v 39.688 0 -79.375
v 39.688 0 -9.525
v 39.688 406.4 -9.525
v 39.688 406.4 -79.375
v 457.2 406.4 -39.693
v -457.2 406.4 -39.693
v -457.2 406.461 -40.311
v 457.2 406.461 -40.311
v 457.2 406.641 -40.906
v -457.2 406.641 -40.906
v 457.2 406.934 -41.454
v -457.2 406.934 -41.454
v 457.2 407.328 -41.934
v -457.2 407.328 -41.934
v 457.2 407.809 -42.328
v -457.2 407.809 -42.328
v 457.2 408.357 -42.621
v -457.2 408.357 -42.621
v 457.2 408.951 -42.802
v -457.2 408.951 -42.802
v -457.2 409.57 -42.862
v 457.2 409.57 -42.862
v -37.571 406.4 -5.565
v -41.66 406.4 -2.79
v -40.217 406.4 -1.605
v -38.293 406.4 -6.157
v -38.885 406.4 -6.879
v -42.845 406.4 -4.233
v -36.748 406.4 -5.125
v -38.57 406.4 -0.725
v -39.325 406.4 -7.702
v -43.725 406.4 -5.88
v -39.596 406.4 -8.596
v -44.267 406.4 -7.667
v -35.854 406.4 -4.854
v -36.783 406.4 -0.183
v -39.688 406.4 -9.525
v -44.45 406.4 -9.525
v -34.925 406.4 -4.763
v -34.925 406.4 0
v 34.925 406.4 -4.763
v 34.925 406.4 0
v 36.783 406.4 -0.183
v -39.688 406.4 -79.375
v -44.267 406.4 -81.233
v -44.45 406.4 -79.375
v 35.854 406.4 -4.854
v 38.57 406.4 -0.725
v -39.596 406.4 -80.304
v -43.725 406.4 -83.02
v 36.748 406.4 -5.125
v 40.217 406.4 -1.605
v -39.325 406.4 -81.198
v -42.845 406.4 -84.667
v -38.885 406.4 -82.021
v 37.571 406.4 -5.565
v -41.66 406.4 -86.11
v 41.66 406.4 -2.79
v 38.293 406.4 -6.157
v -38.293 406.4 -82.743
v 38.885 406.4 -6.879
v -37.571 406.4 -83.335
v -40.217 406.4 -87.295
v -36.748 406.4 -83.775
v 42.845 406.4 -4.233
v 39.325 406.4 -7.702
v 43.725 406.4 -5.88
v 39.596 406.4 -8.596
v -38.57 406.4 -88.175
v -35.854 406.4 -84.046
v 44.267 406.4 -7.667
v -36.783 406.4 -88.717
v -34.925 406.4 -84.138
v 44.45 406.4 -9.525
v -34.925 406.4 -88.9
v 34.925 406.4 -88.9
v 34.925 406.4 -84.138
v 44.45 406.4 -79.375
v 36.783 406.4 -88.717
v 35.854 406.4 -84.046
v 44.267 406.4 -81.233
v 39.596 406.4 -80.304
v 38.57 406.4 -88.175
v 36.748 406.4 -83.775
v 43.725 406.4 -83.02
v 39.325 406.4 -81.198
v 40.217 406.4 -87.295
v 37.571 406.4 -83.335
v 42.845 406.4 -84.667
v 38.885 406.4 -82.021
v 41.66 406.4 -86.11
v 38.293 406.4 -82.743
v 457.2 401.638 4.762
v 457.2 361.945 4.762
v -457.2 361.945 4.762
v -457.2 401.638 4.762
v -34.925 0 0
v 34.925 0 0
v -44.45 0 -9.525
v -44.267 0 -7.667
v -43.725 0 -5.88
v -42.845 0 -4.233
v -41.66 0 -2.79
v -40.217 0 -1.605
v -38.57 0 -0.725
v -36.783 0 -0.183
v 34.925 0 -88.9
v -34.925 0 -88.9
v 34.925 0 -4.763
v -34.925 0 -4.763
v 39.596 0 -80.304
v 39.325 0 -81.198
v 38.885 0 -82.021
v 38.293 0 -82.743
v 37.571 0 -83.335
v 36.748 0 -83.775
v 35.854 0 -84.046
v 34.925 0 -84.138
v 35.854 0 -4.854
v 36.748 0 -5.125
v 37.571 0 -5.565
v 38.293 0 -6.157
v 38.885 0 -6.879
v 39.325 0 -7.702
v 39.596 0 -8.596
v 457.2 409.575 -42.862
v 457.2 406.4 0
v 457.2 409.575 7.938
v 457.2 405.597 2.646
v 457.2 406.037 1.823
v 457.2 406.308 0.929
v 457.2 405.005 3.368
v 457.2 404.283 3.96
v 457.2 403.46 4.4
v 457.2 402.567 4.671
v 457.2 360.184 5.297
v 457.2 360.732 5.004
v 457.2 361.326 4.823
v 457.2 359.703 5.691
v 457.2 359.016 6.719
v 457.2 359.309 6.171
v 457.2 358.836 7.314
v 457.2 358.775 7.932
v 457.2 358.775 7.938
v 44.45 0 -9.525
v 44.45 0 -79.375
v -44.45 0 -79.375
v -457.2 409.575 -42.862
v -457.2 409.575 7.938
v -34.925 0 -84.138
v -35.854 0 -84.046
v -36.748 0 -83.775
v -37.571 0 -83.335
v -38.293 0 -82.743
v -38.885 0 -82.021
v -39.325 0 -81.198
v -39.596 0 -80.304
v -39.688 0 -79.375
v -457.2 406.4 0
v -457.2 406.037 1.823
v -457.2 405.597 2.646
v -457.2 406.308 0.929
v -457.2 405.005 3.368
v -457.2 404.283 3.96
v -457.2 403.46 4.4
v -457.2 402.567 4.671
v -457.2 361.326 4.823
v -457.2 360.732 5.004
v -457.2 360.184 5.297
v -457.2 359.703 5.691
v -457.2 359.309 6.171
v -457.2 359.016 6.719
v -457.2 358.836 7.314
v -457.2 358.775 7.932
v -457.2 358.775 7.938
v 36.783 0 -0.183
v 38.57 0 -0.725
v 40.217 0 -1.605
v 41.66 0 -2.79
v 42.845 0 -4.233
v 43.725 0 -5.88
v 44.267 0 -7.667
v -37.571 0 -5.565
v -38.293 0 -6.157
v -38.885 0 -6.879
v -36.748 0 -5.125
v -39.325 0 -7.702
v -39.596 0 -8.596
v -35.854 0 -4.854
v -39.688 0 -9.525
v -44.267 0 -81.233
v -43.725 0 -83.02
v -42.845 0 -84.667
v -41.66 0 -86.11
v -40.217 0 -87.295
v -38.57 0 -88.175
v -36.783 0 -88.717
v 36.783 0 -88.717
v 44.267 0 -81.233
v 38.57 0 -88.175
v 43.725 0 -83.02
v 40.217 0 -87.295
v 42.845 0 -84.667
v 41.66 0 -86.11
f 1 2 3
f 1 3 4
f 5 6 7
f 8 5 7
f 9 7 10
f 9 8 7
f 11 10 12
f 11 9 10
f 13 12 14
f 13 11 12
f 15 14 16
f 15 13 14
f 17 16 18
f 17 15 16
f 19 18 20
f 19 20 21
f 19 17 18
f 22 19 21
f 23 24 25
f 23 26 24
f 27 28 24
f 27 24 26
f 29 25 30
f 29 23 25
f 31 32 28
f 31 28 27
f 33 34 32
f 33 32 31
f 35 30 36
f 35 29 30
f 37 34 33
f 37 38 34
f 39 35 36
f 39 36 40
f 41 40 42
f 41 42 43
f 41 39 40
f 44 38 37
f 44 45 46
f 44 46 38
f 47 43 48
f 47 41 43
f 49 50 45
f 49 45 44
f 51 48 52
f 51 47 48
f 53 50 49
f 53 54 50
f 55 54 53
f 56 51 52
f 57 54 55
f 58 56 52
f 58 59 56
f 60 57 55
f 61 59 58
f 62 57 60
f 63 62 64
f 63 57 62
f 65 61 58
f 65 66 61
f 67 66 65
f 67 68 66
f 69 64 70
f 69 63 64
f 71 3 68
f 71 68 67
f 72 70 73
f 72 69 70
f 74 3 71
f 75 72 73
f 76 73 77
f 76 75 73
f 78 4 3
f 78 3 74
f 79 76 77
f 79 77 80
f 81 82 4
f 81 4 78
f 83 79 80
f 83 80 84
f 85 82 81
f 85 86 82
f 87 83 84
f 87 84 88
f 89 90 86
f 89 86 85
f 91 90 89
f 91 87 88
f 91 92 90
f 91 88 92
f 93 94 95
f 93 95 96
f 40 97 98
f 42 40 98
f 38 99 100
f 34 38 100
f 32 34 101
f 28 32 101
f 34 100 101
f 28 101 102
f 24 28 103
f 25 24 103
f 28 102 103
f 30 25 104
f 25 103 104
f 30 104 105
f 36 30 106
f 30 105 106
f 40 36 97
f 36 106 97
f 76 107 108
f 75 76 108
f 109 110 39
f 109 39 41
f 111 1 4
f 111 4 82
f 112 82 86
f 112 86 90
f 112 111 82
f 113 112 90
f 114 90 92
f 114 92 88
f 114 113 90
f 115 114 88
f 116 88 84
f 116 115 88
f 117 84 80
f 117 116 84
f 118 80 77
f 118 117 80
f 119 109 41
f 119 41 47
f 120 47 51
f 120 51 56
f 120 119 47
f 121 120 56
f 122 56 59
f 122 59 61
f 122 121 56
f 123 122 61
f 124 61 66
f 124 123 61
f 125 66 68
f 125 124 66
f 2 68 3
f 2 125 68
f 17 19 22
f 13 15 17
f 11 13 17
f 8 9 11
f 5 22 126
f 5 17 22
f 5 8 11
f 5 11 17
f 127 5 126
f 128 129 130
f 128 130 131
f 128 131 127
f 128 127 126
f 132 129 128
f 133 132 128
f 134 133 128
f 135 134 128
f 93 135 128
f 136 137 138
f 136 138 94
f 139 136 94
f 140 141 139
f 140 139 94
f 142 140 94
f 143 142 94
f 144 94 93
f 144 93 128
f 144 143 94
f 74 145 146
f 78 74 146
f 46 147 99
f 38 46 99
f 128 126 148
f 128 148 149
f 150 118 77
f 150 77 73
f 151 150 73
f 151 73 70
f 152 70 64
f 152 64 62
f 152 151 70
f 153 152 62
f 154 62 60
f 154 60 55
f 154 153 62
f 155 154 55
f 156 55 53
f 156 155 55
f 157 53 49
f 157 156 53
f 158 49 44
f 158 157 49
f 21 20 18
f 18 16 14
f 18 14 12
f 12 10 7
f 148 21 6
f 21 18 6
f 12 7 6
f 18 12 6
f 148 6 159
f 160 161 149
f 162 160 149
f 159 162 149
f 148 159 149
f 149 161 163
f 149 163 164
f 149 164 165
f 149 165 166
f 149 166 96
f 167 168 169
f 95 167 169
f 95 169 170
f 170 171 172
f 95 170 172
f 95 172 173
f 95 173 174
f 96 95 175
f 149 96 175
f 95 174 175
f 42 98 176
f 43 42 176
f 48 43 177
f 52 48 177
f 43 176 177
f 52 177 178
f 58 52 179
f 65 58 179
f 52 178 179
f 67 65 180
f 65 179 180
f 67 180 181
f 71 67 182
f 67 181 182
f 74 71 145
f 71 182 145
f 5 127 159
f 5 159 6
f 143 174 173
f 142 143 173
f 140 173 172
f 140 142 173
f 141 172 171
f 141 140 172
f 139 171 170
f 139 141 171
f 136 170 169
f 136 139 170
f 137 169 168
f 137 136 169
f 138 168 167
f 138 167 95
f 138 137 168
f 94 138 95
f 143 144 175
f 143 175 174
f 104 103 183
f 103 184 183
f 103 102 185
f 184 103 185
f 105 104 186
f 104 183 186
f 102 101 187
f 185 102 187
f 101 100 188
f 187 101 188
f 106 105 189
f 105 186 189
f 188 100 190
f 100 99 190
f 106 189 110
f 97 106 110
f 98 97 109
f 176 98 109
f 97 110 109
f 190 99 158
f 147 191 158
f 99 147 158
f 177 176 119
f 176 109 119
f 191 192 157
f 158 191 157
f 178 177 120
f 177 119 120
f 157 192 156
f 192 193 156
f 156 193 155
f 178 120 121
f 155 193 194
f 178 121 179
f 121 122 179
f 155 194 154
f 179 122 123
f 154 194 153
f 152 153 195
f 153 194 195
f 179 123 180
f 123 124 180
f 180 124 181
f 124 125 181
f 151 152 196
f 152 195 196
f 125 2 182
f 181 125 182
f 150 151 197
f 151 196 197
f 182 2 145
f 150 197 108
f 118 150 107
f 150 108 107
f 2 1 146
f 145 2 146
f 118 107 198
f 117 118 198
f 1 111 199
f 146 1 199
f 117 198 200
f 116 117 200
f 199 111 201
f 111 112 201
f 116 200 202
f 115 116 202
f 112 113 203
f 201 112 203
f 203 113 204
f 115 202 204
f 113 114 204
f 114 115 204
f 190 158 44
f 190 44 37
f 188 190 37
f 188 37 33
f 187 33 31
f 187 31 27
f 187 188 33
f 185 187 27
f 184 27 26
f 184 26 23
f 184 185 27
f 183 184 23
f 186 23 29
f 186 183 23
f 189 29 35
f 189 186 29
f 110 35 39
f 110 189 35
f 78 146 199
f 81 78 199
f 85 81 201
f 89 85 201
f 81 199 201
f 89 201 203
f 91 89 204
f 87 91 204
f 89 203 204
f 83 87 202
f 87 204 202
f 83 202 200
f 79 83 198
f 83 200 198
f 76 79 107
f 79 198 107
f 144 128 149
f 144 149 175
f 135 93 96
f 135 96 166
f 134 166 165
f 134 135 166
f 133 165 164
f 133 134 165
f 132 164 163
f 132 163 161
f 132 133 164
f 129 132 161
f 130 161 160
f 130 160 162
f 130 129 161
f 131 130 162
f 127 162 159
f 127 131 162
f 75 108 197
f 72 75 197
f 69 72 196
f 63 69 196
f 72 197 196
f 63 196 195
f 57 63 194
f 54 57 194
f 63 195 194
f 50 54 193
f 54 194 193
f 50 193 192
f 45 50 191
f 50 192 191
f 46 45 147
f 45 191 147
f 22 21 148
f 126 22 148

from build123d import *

# Parameters (mm, degrees)
VERTICAL_DEPTH = 406.4
CROSSBAR_DEPTH = 914.4


with BuildPart() as part:
    # Sketch12 → vertical (new body)
    with BuildSketch(Plane(origin=(0, 0, -44.45), x_dir=(1, 0, 0), z_dir=(0, 1, 0))):
        with BuildLine():
            Line((-34.925, -44.45), (34.925, -44.45))
            ThreePointArc((34.925, -44.45), (41.660192091, -41.660192091), (44.45, -34.925))
            Line((44.45, -34.925), (44.45, 34.925))
            ThreePointArc((44.45, 34.925), (41.660192091, 41.660192091), (34.925, 44.45))
            Line((34.925, 44.45), (-34.925, 44.45))
            ThreePointArc((-34.925, 44.45), (-41.660192091, 41.660192091), (-44.45, 34.925))
            Line((-44.45, 34.925), (-44.45, -34.925))
            ThreePointArc((-44.45, -34.925), (-41.660192091, -41.660192091), (-34.925, -44.45))
        make_face()
        with BuildLine():
            Line((-34.925, -39.6875), (34.925, -39.6875))
            ThreePointArc((34.925, -39.6875), (38.292596045, -38.292596045), (39.6875, -34.925))
            Line((39.6875, -34.925), (39.6875, 34.925))
            ThreePointArc((39.6875, 34.925), (38.292596045, 38.292596045), (34.925, 39.6875))
            Line((34.925, 39.6875), (-34.925, 39.6875))
            ThreePointArc((-34.925, 39.6875), (-38.292596045, 38.292596045), (-39.6875, 34.925))
            Line((-39.6875, 34.925), (-39.6875, -34.925))
            ThreePointArc((-39.6875, -34.925), (-38.292596045, -38.292596045), (-34.925, -39.6875))
        make_face(mode=Mode.SUBTRACT)
    extrude(amount=VERTICAL_DEPTH)


with BuildPart() as body_2:
    # Sketch13 → crossbar (new body)
    with BuildSketch(Plane(origin=(457.2, 409.575, 7.9375), x_dir=(0, 0, -1), z_dir=(-1, 0, 0))):
        with BuildLine():
            Line((0, 0), (0, 50.8))
            Line((0, 50.8), (0.00508, 50.8))
            ThreePointArc((0.00508, 50.8), (2.246551928, 49.871551928), (3.175, 47.63008))
            Line((3.175, 47.63008), (3.175, 7.9375))
            ThreePointArc((3.175, 7.9375), (4.569903955, 4.569903955), (7.9375, 3.175))
            Line((7.9375, 3.175), (47.63008, 3.175))
            ThreePointArc((47.63008, 3.175), (49.871551928, 2.246551928), (50.8, 0.00508))
            Line((50.8, 0.00508), (50.8, 0))
            Line((50.8, 0), (0, 0))
        make_face()
    extrude(amount=CROSSBAR_DEPTH)


solid = Compound([part.part, body_2.part])
